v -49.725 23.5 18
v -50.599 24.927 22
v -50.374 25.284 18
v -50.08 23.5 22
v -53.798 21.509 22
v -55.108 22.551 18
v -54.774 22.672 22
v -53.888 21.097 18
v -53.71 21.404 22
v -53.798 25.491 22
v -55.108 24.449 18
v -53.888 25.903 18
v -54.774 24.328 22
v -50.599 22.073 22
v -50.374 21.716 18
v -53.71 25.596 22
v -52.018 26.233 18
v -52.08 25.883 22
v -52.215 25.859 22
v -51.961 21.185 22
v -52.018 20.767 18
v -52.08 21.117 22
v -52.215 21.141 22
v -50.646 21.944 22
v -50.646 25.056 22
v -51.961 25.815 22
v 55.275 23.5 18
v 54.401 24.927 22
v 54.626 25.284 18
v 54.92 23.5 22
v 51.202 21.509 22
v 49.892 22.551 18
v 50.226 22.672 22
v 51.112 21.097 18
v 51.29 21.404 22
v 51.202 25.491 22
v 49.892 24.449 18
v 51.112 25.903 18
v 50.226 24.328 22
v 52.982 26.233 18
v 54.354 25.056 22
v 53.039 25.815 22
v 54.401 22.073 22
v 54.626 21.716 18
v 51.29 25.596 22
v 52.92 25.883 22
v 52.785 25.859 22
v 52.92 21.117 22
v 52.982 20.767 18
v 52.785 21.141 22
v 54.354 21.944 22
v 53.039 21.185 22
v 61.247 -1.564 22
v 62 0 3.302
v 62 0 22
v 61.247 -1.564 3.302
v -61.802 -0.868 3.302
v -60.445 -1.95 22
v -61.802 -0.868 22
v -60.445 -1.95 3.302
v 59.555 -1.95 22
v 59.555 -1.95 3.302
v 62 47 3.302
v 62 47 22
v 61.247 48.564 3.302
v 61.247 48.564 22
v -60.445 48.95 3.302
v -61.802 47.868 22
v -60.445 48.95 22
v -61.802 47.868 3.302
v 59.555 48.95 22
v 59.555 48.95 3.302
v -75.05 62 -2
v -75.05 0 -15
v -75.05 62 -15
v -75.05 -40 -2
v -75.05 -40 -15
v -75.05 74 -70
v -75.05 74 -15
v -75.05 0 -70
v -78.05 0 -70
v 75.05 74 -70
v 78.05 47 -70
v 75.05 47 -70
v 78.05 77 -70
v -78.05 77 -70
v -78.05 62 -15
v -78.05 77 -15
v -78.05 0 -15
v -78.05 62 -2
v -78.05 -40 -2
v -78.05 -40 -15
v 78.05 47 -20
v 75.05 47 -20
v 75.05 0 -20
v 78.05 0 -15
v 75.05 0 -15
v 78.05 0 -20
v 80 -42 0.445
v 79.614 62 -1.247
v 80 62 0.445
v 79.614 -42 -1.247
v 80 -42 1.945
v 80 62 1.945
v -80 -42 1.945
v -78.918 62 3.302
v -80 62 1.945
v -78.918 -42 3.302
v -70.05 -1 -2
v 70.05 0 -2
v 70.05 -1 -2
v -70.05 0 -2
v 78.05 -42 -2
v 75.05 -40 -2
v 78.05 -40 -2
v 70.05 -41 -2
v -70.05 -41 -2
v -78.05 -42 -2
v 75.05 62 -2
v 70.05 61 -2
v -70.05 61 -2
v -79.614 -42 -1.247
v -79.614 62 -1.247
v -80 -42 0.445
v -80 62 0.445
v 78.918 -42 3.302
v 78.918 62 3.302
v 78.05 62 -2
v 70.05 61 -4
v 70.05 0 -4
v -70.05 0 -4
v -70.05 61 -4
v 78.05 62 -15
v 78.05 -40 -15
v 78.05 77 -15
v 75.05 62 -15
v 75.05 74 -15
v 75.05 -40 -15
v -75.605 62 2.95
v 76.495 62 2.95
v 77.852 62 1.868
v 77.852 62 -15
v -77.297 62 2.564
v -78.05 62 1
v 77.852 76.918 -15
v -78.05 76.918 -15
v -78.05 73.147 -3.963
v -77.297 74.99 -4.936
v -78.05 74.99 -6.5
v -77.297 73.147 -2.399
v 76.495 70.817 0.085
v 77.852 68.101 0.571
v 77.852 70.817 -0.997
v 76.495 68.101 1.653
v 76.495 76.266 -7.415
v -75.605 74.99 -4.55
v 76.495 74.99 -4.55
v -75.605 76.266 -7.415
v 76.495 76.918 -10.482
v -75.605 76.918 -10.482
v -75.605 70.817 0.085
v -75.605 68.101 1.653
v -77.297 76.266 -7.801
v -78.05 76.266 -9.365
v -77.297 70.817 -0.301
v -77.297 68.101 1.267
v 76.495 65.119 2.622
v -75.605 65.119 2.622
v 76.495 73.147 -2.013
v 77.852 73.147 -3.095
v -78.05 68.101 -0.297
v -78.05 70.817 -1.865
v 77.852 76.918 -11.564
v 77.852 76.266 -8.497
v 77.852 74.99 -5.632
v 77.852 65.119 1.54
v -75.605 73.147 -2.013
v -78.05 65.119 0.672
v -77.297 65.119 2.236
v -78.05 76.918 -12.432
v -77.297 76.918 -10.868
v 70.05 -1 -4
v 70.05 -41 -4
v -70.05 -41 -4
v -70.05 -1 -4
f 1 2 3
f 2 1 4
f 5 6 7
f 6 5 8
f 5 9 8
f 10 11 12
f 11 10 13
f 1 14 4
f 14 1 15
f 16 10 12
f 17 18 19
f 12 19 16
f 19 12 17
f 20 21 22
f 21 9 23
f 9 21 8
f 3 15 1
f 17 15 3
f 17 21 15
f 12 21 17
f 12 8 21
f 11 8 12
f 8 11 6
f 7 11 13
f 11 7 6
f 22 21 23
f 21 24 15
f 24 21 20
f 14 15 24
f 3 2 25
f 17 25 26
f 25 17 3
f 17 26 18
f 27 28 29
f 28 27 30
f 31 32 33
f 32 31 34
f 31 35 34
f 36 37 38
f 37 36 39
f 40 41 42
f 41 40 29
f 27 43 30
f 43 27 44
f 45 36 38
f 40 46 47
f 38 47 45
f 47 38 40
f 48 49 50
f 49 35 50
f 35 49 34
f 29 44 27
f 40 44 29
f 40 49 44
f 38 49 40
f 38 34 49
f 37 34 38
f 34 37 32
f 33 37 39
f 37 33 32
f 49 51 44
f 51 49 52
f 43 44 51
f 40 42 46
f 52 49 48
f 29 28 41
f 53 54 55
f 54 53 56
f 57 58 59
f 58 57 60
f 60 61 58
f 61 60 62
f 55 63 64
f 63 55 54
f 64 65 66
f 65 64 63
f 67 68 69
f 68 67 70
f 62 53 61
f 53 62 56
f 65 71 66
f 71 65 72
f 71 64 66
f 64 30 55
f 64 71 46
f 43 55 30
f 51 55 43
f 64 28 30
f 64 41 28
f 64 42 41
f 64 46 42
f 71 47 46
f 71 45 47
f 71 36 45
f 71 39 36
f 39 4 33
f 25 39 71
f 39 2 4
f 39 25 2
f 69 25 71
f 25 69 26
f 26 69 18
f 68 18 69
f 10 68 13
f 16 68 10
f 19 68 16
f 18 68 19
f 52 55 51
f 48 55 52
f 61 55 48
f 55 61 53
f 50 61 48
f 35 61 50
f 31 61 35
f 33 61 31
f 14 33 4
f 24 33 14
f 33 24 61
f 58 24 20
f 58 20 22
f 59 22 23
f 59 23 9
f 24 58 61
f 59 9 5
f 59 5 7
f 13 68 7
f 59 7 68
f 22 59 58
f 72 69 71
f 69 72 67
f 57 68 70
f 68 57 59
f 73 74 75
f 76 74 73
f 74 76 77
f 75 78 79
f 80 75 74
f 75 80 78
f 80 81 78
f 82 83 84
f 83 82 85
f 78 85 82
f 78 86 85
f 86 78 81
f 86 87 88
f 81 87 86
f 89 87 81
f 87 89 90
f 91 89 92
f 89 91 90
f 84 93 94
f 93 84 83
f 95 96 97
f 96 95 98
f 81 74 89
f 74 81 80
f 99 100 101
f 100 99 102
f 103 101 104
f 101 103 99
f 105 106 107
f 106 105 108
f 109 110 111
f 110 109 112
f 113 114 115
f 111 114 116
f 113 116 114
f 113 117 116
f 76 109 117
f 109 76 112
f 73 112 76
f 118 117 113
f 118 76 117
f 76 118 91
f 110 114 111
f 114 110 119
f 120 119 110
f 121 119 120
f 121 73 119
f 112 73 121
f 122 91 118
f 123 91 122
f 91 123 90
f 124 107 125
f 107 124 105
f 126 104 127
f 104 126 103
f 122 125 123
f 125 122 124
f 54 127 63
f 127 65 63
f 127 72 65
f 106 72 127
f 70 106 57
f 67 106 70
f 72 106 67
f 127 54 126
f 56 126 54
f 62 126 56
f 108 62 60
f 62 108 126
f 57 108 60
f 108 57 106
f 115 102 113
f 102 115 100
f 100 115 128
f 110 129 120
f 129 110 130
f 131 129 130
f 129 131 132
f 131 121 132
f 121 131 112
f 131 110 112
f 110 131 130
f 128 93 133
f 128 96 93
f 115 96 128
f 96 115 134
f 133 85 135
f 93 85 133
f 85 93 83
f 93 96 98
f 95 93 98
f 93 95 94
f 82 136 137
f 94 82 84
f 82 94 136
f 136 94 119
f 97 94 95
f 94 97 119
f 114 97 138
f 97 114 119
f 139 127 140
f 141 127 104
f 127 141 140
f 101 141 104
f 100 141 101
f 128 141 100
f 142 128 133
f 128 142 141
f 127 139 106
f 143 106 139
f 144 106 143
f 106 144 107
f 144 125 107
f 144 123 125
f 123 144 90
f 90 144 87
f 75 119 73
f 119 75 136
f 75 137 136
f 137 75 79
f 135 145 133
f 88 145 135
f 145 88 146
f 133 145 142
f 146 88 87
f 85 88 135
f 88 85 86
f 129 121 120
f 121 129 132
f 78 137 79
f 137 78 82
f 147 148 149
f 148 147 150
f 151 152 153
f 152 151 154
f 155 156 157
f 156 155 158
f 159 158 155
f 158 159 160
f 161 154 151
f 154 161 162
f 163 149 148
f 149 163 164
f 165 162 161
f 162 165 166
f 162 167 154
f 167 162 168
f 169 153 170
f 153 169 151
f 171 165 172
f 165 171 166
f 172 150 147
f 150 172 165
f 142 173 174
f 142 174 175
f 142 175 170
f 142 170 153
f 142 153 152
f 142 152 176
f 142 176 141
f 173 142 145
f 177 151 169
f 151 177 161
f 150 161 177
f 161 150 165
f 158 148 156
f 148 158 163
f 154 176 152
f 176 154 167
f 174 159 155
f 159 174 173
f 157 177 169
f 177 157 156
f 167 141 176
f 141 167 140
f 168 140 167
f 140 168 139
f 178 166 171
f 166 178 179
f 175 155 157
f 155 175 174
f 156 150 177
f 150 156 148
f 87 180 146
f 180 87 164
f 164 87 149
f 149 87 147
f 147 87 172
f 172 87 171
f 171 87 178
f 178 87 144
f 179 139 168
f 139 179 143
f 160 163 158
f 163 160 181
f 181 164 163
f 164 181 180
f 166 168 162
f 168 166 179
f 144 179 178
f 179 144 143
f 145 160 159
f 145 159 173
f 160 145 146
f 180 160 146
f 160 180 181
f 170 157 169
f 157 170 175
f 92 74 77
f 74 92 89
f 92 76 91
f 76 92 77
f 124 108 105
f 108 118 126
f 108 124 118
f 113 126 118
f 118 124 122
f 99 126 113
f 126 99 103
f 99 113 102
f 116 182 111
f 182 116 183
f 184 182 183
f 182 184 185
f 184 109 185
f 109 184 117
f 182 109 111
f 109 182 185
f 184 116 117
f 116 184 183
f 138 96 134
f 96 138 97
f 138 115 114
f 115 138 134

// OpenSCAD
// we want something that can sit across the
// 5.25" bay holders and support the XTOP's
// mounts, designed to mate to a 120mm fan.
// 5.25" bay is 146.1mm wide
w = 146.1;

// we want to look like a 120mm fan
iw = 120;
hw = 105; // screw hole centers are 105mm apart

// the mounts are 26mm
m1 = 47;

// we need a 16mm tall core to match the height
// of the other mount, sitting atop two fans and
// a radiator. on the outside, though, we don't
// want it so thicc, in case there's another
// device in the next bay up
h1 = 20;

// come just about down to the bottom
h2 = 70;

// brace we're topping is 1.5mm wide. give it
// an extra half mm.
i = 2;

// 5.55mm diameter screws
sw = 5.55 / 2;

// the wings on the sides hold us onto the
// braces. if they're too thin, they'll break off.
ww = 3;

translate([-w/2, 0, 0]){
    // left wing is extended to the bottom
    translate([-(i + ww), 0, -h2]){
        cube([ww, m1, h2]);
    }
    // upper support (what the pump mates)
    translate([(w - iw) / 2, 0, 0]){
        
        difference(){
            minkowski(){
                cube([iw, m1, h1]);
                cylinder(r = 2, h = 2);
            }
            union(){
                translate([(iw - hw) / 2, m1 / 2, h1 - 2]){
                    cylinder(h1, sw, true);
                }
                translate([(iw - hw) / 2 + hw, m1 / 2, h1 - 2]){
                    cylinder(h1, sw, true);
                }
            }
        }
    }
    // common layer
    translate([-(i + ww), 0, 0]){
        minkowski(){
            cube([w + i * 2 + ww * 2, m1, 1.5]);
            rotate([90, 90, 0]){
                cylinder(r = 2, h = 2);
            }
        }
    }
    // middle piece to wedge us atop bay mounts
    translate([i + 1, 0, -4]){
        cube([w - i * 2 - 2, m1, 4]);
    }
    // right wing
    translate([w + i, 0, -h1]){
        cube([ww, m1, h1]);
    }
}

// 15mm from xtop brace to back
m2 = 15;

translate([0, m1, 0]){
translate([-w/2, 0, 0]){
    // left wing
    translate([-(i + ww), 0, -h2]){
      cube([ww, m2, h2]);
    }
    translate([-(i + ww), 15, -h2]){
      cube([ww, m2, h2 - 15]);
    }
    
    // common layer
    translate([-(i + ww), 0, 0]){
        minkowski(){
            cube([w + i * 2 + ww * 2, m2, 1.5]);
            rotate([90, 90, 0]){
                cylinder(r = 2, h = 2);
            }
        }
    }
    // middle piece to wedge us atop bay mounts
    translate([i + 1, -1, -4]){
        cube([w - i * 2 - 2, m2, 4]);
    }
    // right wing
    translate([w + i, 0, -h2]){
      cube([ww, m2, h2]);
    }
    translate([w + i, 15, -h2]){
      cube([ww, m2, h2 - 15]);
    }

    // backplate
    translate([-i, m2 + 12, -h2]){
      cube([w + i * 2, ww, h2 - 15]);
    }

}

difference(){
  translate([0, m2, -m2 + 1]){
    rotate([0, 90, 0]){
      minkowski(){
        cylinder(w + i * 3, m2, m2, true);
        rotate([90, 90, 0]){
          cylinder(2, 2, 2);
        }
      }
    }
  }
  union(){
    translate([0, 0, -45]){
      cube([w + i * 15, m2 * 4, m2 * 4], true);
    }
    translate([0, -m2, -m2]){
      cube([w + i * 15, m2 * 4, m2 * 4], true);
    }
  }
}
}

// 40mm from xtop brace to fan
m3 = 40;

// don't interfere with the screws
h3 = 15;

translate([-w/2, -m3, 0]){
    // left wing
    translate([-(i + ww), 0, -h3]){
        cube([ww, m3, h3]);
    }
    // common layer
    translate([-(i + ww), 0, 0]){
        minkowski(){
            cube([w + i * 2 + ww * 2, m3, 1.5]);
            rotate([90, 90, 0]){
                cylinder(r = 2, h = 2);
            }
        }
    }
    // middle piece to wedge us atop bay mounts
    translate([i + 1, -1, -4]){
        cube([w - i * 2 - 2, m3, 4]);
    }
    // right wing
    translate([w + i, 0, -h3]){
        cube([ww, m3, h3]);
    }
}
